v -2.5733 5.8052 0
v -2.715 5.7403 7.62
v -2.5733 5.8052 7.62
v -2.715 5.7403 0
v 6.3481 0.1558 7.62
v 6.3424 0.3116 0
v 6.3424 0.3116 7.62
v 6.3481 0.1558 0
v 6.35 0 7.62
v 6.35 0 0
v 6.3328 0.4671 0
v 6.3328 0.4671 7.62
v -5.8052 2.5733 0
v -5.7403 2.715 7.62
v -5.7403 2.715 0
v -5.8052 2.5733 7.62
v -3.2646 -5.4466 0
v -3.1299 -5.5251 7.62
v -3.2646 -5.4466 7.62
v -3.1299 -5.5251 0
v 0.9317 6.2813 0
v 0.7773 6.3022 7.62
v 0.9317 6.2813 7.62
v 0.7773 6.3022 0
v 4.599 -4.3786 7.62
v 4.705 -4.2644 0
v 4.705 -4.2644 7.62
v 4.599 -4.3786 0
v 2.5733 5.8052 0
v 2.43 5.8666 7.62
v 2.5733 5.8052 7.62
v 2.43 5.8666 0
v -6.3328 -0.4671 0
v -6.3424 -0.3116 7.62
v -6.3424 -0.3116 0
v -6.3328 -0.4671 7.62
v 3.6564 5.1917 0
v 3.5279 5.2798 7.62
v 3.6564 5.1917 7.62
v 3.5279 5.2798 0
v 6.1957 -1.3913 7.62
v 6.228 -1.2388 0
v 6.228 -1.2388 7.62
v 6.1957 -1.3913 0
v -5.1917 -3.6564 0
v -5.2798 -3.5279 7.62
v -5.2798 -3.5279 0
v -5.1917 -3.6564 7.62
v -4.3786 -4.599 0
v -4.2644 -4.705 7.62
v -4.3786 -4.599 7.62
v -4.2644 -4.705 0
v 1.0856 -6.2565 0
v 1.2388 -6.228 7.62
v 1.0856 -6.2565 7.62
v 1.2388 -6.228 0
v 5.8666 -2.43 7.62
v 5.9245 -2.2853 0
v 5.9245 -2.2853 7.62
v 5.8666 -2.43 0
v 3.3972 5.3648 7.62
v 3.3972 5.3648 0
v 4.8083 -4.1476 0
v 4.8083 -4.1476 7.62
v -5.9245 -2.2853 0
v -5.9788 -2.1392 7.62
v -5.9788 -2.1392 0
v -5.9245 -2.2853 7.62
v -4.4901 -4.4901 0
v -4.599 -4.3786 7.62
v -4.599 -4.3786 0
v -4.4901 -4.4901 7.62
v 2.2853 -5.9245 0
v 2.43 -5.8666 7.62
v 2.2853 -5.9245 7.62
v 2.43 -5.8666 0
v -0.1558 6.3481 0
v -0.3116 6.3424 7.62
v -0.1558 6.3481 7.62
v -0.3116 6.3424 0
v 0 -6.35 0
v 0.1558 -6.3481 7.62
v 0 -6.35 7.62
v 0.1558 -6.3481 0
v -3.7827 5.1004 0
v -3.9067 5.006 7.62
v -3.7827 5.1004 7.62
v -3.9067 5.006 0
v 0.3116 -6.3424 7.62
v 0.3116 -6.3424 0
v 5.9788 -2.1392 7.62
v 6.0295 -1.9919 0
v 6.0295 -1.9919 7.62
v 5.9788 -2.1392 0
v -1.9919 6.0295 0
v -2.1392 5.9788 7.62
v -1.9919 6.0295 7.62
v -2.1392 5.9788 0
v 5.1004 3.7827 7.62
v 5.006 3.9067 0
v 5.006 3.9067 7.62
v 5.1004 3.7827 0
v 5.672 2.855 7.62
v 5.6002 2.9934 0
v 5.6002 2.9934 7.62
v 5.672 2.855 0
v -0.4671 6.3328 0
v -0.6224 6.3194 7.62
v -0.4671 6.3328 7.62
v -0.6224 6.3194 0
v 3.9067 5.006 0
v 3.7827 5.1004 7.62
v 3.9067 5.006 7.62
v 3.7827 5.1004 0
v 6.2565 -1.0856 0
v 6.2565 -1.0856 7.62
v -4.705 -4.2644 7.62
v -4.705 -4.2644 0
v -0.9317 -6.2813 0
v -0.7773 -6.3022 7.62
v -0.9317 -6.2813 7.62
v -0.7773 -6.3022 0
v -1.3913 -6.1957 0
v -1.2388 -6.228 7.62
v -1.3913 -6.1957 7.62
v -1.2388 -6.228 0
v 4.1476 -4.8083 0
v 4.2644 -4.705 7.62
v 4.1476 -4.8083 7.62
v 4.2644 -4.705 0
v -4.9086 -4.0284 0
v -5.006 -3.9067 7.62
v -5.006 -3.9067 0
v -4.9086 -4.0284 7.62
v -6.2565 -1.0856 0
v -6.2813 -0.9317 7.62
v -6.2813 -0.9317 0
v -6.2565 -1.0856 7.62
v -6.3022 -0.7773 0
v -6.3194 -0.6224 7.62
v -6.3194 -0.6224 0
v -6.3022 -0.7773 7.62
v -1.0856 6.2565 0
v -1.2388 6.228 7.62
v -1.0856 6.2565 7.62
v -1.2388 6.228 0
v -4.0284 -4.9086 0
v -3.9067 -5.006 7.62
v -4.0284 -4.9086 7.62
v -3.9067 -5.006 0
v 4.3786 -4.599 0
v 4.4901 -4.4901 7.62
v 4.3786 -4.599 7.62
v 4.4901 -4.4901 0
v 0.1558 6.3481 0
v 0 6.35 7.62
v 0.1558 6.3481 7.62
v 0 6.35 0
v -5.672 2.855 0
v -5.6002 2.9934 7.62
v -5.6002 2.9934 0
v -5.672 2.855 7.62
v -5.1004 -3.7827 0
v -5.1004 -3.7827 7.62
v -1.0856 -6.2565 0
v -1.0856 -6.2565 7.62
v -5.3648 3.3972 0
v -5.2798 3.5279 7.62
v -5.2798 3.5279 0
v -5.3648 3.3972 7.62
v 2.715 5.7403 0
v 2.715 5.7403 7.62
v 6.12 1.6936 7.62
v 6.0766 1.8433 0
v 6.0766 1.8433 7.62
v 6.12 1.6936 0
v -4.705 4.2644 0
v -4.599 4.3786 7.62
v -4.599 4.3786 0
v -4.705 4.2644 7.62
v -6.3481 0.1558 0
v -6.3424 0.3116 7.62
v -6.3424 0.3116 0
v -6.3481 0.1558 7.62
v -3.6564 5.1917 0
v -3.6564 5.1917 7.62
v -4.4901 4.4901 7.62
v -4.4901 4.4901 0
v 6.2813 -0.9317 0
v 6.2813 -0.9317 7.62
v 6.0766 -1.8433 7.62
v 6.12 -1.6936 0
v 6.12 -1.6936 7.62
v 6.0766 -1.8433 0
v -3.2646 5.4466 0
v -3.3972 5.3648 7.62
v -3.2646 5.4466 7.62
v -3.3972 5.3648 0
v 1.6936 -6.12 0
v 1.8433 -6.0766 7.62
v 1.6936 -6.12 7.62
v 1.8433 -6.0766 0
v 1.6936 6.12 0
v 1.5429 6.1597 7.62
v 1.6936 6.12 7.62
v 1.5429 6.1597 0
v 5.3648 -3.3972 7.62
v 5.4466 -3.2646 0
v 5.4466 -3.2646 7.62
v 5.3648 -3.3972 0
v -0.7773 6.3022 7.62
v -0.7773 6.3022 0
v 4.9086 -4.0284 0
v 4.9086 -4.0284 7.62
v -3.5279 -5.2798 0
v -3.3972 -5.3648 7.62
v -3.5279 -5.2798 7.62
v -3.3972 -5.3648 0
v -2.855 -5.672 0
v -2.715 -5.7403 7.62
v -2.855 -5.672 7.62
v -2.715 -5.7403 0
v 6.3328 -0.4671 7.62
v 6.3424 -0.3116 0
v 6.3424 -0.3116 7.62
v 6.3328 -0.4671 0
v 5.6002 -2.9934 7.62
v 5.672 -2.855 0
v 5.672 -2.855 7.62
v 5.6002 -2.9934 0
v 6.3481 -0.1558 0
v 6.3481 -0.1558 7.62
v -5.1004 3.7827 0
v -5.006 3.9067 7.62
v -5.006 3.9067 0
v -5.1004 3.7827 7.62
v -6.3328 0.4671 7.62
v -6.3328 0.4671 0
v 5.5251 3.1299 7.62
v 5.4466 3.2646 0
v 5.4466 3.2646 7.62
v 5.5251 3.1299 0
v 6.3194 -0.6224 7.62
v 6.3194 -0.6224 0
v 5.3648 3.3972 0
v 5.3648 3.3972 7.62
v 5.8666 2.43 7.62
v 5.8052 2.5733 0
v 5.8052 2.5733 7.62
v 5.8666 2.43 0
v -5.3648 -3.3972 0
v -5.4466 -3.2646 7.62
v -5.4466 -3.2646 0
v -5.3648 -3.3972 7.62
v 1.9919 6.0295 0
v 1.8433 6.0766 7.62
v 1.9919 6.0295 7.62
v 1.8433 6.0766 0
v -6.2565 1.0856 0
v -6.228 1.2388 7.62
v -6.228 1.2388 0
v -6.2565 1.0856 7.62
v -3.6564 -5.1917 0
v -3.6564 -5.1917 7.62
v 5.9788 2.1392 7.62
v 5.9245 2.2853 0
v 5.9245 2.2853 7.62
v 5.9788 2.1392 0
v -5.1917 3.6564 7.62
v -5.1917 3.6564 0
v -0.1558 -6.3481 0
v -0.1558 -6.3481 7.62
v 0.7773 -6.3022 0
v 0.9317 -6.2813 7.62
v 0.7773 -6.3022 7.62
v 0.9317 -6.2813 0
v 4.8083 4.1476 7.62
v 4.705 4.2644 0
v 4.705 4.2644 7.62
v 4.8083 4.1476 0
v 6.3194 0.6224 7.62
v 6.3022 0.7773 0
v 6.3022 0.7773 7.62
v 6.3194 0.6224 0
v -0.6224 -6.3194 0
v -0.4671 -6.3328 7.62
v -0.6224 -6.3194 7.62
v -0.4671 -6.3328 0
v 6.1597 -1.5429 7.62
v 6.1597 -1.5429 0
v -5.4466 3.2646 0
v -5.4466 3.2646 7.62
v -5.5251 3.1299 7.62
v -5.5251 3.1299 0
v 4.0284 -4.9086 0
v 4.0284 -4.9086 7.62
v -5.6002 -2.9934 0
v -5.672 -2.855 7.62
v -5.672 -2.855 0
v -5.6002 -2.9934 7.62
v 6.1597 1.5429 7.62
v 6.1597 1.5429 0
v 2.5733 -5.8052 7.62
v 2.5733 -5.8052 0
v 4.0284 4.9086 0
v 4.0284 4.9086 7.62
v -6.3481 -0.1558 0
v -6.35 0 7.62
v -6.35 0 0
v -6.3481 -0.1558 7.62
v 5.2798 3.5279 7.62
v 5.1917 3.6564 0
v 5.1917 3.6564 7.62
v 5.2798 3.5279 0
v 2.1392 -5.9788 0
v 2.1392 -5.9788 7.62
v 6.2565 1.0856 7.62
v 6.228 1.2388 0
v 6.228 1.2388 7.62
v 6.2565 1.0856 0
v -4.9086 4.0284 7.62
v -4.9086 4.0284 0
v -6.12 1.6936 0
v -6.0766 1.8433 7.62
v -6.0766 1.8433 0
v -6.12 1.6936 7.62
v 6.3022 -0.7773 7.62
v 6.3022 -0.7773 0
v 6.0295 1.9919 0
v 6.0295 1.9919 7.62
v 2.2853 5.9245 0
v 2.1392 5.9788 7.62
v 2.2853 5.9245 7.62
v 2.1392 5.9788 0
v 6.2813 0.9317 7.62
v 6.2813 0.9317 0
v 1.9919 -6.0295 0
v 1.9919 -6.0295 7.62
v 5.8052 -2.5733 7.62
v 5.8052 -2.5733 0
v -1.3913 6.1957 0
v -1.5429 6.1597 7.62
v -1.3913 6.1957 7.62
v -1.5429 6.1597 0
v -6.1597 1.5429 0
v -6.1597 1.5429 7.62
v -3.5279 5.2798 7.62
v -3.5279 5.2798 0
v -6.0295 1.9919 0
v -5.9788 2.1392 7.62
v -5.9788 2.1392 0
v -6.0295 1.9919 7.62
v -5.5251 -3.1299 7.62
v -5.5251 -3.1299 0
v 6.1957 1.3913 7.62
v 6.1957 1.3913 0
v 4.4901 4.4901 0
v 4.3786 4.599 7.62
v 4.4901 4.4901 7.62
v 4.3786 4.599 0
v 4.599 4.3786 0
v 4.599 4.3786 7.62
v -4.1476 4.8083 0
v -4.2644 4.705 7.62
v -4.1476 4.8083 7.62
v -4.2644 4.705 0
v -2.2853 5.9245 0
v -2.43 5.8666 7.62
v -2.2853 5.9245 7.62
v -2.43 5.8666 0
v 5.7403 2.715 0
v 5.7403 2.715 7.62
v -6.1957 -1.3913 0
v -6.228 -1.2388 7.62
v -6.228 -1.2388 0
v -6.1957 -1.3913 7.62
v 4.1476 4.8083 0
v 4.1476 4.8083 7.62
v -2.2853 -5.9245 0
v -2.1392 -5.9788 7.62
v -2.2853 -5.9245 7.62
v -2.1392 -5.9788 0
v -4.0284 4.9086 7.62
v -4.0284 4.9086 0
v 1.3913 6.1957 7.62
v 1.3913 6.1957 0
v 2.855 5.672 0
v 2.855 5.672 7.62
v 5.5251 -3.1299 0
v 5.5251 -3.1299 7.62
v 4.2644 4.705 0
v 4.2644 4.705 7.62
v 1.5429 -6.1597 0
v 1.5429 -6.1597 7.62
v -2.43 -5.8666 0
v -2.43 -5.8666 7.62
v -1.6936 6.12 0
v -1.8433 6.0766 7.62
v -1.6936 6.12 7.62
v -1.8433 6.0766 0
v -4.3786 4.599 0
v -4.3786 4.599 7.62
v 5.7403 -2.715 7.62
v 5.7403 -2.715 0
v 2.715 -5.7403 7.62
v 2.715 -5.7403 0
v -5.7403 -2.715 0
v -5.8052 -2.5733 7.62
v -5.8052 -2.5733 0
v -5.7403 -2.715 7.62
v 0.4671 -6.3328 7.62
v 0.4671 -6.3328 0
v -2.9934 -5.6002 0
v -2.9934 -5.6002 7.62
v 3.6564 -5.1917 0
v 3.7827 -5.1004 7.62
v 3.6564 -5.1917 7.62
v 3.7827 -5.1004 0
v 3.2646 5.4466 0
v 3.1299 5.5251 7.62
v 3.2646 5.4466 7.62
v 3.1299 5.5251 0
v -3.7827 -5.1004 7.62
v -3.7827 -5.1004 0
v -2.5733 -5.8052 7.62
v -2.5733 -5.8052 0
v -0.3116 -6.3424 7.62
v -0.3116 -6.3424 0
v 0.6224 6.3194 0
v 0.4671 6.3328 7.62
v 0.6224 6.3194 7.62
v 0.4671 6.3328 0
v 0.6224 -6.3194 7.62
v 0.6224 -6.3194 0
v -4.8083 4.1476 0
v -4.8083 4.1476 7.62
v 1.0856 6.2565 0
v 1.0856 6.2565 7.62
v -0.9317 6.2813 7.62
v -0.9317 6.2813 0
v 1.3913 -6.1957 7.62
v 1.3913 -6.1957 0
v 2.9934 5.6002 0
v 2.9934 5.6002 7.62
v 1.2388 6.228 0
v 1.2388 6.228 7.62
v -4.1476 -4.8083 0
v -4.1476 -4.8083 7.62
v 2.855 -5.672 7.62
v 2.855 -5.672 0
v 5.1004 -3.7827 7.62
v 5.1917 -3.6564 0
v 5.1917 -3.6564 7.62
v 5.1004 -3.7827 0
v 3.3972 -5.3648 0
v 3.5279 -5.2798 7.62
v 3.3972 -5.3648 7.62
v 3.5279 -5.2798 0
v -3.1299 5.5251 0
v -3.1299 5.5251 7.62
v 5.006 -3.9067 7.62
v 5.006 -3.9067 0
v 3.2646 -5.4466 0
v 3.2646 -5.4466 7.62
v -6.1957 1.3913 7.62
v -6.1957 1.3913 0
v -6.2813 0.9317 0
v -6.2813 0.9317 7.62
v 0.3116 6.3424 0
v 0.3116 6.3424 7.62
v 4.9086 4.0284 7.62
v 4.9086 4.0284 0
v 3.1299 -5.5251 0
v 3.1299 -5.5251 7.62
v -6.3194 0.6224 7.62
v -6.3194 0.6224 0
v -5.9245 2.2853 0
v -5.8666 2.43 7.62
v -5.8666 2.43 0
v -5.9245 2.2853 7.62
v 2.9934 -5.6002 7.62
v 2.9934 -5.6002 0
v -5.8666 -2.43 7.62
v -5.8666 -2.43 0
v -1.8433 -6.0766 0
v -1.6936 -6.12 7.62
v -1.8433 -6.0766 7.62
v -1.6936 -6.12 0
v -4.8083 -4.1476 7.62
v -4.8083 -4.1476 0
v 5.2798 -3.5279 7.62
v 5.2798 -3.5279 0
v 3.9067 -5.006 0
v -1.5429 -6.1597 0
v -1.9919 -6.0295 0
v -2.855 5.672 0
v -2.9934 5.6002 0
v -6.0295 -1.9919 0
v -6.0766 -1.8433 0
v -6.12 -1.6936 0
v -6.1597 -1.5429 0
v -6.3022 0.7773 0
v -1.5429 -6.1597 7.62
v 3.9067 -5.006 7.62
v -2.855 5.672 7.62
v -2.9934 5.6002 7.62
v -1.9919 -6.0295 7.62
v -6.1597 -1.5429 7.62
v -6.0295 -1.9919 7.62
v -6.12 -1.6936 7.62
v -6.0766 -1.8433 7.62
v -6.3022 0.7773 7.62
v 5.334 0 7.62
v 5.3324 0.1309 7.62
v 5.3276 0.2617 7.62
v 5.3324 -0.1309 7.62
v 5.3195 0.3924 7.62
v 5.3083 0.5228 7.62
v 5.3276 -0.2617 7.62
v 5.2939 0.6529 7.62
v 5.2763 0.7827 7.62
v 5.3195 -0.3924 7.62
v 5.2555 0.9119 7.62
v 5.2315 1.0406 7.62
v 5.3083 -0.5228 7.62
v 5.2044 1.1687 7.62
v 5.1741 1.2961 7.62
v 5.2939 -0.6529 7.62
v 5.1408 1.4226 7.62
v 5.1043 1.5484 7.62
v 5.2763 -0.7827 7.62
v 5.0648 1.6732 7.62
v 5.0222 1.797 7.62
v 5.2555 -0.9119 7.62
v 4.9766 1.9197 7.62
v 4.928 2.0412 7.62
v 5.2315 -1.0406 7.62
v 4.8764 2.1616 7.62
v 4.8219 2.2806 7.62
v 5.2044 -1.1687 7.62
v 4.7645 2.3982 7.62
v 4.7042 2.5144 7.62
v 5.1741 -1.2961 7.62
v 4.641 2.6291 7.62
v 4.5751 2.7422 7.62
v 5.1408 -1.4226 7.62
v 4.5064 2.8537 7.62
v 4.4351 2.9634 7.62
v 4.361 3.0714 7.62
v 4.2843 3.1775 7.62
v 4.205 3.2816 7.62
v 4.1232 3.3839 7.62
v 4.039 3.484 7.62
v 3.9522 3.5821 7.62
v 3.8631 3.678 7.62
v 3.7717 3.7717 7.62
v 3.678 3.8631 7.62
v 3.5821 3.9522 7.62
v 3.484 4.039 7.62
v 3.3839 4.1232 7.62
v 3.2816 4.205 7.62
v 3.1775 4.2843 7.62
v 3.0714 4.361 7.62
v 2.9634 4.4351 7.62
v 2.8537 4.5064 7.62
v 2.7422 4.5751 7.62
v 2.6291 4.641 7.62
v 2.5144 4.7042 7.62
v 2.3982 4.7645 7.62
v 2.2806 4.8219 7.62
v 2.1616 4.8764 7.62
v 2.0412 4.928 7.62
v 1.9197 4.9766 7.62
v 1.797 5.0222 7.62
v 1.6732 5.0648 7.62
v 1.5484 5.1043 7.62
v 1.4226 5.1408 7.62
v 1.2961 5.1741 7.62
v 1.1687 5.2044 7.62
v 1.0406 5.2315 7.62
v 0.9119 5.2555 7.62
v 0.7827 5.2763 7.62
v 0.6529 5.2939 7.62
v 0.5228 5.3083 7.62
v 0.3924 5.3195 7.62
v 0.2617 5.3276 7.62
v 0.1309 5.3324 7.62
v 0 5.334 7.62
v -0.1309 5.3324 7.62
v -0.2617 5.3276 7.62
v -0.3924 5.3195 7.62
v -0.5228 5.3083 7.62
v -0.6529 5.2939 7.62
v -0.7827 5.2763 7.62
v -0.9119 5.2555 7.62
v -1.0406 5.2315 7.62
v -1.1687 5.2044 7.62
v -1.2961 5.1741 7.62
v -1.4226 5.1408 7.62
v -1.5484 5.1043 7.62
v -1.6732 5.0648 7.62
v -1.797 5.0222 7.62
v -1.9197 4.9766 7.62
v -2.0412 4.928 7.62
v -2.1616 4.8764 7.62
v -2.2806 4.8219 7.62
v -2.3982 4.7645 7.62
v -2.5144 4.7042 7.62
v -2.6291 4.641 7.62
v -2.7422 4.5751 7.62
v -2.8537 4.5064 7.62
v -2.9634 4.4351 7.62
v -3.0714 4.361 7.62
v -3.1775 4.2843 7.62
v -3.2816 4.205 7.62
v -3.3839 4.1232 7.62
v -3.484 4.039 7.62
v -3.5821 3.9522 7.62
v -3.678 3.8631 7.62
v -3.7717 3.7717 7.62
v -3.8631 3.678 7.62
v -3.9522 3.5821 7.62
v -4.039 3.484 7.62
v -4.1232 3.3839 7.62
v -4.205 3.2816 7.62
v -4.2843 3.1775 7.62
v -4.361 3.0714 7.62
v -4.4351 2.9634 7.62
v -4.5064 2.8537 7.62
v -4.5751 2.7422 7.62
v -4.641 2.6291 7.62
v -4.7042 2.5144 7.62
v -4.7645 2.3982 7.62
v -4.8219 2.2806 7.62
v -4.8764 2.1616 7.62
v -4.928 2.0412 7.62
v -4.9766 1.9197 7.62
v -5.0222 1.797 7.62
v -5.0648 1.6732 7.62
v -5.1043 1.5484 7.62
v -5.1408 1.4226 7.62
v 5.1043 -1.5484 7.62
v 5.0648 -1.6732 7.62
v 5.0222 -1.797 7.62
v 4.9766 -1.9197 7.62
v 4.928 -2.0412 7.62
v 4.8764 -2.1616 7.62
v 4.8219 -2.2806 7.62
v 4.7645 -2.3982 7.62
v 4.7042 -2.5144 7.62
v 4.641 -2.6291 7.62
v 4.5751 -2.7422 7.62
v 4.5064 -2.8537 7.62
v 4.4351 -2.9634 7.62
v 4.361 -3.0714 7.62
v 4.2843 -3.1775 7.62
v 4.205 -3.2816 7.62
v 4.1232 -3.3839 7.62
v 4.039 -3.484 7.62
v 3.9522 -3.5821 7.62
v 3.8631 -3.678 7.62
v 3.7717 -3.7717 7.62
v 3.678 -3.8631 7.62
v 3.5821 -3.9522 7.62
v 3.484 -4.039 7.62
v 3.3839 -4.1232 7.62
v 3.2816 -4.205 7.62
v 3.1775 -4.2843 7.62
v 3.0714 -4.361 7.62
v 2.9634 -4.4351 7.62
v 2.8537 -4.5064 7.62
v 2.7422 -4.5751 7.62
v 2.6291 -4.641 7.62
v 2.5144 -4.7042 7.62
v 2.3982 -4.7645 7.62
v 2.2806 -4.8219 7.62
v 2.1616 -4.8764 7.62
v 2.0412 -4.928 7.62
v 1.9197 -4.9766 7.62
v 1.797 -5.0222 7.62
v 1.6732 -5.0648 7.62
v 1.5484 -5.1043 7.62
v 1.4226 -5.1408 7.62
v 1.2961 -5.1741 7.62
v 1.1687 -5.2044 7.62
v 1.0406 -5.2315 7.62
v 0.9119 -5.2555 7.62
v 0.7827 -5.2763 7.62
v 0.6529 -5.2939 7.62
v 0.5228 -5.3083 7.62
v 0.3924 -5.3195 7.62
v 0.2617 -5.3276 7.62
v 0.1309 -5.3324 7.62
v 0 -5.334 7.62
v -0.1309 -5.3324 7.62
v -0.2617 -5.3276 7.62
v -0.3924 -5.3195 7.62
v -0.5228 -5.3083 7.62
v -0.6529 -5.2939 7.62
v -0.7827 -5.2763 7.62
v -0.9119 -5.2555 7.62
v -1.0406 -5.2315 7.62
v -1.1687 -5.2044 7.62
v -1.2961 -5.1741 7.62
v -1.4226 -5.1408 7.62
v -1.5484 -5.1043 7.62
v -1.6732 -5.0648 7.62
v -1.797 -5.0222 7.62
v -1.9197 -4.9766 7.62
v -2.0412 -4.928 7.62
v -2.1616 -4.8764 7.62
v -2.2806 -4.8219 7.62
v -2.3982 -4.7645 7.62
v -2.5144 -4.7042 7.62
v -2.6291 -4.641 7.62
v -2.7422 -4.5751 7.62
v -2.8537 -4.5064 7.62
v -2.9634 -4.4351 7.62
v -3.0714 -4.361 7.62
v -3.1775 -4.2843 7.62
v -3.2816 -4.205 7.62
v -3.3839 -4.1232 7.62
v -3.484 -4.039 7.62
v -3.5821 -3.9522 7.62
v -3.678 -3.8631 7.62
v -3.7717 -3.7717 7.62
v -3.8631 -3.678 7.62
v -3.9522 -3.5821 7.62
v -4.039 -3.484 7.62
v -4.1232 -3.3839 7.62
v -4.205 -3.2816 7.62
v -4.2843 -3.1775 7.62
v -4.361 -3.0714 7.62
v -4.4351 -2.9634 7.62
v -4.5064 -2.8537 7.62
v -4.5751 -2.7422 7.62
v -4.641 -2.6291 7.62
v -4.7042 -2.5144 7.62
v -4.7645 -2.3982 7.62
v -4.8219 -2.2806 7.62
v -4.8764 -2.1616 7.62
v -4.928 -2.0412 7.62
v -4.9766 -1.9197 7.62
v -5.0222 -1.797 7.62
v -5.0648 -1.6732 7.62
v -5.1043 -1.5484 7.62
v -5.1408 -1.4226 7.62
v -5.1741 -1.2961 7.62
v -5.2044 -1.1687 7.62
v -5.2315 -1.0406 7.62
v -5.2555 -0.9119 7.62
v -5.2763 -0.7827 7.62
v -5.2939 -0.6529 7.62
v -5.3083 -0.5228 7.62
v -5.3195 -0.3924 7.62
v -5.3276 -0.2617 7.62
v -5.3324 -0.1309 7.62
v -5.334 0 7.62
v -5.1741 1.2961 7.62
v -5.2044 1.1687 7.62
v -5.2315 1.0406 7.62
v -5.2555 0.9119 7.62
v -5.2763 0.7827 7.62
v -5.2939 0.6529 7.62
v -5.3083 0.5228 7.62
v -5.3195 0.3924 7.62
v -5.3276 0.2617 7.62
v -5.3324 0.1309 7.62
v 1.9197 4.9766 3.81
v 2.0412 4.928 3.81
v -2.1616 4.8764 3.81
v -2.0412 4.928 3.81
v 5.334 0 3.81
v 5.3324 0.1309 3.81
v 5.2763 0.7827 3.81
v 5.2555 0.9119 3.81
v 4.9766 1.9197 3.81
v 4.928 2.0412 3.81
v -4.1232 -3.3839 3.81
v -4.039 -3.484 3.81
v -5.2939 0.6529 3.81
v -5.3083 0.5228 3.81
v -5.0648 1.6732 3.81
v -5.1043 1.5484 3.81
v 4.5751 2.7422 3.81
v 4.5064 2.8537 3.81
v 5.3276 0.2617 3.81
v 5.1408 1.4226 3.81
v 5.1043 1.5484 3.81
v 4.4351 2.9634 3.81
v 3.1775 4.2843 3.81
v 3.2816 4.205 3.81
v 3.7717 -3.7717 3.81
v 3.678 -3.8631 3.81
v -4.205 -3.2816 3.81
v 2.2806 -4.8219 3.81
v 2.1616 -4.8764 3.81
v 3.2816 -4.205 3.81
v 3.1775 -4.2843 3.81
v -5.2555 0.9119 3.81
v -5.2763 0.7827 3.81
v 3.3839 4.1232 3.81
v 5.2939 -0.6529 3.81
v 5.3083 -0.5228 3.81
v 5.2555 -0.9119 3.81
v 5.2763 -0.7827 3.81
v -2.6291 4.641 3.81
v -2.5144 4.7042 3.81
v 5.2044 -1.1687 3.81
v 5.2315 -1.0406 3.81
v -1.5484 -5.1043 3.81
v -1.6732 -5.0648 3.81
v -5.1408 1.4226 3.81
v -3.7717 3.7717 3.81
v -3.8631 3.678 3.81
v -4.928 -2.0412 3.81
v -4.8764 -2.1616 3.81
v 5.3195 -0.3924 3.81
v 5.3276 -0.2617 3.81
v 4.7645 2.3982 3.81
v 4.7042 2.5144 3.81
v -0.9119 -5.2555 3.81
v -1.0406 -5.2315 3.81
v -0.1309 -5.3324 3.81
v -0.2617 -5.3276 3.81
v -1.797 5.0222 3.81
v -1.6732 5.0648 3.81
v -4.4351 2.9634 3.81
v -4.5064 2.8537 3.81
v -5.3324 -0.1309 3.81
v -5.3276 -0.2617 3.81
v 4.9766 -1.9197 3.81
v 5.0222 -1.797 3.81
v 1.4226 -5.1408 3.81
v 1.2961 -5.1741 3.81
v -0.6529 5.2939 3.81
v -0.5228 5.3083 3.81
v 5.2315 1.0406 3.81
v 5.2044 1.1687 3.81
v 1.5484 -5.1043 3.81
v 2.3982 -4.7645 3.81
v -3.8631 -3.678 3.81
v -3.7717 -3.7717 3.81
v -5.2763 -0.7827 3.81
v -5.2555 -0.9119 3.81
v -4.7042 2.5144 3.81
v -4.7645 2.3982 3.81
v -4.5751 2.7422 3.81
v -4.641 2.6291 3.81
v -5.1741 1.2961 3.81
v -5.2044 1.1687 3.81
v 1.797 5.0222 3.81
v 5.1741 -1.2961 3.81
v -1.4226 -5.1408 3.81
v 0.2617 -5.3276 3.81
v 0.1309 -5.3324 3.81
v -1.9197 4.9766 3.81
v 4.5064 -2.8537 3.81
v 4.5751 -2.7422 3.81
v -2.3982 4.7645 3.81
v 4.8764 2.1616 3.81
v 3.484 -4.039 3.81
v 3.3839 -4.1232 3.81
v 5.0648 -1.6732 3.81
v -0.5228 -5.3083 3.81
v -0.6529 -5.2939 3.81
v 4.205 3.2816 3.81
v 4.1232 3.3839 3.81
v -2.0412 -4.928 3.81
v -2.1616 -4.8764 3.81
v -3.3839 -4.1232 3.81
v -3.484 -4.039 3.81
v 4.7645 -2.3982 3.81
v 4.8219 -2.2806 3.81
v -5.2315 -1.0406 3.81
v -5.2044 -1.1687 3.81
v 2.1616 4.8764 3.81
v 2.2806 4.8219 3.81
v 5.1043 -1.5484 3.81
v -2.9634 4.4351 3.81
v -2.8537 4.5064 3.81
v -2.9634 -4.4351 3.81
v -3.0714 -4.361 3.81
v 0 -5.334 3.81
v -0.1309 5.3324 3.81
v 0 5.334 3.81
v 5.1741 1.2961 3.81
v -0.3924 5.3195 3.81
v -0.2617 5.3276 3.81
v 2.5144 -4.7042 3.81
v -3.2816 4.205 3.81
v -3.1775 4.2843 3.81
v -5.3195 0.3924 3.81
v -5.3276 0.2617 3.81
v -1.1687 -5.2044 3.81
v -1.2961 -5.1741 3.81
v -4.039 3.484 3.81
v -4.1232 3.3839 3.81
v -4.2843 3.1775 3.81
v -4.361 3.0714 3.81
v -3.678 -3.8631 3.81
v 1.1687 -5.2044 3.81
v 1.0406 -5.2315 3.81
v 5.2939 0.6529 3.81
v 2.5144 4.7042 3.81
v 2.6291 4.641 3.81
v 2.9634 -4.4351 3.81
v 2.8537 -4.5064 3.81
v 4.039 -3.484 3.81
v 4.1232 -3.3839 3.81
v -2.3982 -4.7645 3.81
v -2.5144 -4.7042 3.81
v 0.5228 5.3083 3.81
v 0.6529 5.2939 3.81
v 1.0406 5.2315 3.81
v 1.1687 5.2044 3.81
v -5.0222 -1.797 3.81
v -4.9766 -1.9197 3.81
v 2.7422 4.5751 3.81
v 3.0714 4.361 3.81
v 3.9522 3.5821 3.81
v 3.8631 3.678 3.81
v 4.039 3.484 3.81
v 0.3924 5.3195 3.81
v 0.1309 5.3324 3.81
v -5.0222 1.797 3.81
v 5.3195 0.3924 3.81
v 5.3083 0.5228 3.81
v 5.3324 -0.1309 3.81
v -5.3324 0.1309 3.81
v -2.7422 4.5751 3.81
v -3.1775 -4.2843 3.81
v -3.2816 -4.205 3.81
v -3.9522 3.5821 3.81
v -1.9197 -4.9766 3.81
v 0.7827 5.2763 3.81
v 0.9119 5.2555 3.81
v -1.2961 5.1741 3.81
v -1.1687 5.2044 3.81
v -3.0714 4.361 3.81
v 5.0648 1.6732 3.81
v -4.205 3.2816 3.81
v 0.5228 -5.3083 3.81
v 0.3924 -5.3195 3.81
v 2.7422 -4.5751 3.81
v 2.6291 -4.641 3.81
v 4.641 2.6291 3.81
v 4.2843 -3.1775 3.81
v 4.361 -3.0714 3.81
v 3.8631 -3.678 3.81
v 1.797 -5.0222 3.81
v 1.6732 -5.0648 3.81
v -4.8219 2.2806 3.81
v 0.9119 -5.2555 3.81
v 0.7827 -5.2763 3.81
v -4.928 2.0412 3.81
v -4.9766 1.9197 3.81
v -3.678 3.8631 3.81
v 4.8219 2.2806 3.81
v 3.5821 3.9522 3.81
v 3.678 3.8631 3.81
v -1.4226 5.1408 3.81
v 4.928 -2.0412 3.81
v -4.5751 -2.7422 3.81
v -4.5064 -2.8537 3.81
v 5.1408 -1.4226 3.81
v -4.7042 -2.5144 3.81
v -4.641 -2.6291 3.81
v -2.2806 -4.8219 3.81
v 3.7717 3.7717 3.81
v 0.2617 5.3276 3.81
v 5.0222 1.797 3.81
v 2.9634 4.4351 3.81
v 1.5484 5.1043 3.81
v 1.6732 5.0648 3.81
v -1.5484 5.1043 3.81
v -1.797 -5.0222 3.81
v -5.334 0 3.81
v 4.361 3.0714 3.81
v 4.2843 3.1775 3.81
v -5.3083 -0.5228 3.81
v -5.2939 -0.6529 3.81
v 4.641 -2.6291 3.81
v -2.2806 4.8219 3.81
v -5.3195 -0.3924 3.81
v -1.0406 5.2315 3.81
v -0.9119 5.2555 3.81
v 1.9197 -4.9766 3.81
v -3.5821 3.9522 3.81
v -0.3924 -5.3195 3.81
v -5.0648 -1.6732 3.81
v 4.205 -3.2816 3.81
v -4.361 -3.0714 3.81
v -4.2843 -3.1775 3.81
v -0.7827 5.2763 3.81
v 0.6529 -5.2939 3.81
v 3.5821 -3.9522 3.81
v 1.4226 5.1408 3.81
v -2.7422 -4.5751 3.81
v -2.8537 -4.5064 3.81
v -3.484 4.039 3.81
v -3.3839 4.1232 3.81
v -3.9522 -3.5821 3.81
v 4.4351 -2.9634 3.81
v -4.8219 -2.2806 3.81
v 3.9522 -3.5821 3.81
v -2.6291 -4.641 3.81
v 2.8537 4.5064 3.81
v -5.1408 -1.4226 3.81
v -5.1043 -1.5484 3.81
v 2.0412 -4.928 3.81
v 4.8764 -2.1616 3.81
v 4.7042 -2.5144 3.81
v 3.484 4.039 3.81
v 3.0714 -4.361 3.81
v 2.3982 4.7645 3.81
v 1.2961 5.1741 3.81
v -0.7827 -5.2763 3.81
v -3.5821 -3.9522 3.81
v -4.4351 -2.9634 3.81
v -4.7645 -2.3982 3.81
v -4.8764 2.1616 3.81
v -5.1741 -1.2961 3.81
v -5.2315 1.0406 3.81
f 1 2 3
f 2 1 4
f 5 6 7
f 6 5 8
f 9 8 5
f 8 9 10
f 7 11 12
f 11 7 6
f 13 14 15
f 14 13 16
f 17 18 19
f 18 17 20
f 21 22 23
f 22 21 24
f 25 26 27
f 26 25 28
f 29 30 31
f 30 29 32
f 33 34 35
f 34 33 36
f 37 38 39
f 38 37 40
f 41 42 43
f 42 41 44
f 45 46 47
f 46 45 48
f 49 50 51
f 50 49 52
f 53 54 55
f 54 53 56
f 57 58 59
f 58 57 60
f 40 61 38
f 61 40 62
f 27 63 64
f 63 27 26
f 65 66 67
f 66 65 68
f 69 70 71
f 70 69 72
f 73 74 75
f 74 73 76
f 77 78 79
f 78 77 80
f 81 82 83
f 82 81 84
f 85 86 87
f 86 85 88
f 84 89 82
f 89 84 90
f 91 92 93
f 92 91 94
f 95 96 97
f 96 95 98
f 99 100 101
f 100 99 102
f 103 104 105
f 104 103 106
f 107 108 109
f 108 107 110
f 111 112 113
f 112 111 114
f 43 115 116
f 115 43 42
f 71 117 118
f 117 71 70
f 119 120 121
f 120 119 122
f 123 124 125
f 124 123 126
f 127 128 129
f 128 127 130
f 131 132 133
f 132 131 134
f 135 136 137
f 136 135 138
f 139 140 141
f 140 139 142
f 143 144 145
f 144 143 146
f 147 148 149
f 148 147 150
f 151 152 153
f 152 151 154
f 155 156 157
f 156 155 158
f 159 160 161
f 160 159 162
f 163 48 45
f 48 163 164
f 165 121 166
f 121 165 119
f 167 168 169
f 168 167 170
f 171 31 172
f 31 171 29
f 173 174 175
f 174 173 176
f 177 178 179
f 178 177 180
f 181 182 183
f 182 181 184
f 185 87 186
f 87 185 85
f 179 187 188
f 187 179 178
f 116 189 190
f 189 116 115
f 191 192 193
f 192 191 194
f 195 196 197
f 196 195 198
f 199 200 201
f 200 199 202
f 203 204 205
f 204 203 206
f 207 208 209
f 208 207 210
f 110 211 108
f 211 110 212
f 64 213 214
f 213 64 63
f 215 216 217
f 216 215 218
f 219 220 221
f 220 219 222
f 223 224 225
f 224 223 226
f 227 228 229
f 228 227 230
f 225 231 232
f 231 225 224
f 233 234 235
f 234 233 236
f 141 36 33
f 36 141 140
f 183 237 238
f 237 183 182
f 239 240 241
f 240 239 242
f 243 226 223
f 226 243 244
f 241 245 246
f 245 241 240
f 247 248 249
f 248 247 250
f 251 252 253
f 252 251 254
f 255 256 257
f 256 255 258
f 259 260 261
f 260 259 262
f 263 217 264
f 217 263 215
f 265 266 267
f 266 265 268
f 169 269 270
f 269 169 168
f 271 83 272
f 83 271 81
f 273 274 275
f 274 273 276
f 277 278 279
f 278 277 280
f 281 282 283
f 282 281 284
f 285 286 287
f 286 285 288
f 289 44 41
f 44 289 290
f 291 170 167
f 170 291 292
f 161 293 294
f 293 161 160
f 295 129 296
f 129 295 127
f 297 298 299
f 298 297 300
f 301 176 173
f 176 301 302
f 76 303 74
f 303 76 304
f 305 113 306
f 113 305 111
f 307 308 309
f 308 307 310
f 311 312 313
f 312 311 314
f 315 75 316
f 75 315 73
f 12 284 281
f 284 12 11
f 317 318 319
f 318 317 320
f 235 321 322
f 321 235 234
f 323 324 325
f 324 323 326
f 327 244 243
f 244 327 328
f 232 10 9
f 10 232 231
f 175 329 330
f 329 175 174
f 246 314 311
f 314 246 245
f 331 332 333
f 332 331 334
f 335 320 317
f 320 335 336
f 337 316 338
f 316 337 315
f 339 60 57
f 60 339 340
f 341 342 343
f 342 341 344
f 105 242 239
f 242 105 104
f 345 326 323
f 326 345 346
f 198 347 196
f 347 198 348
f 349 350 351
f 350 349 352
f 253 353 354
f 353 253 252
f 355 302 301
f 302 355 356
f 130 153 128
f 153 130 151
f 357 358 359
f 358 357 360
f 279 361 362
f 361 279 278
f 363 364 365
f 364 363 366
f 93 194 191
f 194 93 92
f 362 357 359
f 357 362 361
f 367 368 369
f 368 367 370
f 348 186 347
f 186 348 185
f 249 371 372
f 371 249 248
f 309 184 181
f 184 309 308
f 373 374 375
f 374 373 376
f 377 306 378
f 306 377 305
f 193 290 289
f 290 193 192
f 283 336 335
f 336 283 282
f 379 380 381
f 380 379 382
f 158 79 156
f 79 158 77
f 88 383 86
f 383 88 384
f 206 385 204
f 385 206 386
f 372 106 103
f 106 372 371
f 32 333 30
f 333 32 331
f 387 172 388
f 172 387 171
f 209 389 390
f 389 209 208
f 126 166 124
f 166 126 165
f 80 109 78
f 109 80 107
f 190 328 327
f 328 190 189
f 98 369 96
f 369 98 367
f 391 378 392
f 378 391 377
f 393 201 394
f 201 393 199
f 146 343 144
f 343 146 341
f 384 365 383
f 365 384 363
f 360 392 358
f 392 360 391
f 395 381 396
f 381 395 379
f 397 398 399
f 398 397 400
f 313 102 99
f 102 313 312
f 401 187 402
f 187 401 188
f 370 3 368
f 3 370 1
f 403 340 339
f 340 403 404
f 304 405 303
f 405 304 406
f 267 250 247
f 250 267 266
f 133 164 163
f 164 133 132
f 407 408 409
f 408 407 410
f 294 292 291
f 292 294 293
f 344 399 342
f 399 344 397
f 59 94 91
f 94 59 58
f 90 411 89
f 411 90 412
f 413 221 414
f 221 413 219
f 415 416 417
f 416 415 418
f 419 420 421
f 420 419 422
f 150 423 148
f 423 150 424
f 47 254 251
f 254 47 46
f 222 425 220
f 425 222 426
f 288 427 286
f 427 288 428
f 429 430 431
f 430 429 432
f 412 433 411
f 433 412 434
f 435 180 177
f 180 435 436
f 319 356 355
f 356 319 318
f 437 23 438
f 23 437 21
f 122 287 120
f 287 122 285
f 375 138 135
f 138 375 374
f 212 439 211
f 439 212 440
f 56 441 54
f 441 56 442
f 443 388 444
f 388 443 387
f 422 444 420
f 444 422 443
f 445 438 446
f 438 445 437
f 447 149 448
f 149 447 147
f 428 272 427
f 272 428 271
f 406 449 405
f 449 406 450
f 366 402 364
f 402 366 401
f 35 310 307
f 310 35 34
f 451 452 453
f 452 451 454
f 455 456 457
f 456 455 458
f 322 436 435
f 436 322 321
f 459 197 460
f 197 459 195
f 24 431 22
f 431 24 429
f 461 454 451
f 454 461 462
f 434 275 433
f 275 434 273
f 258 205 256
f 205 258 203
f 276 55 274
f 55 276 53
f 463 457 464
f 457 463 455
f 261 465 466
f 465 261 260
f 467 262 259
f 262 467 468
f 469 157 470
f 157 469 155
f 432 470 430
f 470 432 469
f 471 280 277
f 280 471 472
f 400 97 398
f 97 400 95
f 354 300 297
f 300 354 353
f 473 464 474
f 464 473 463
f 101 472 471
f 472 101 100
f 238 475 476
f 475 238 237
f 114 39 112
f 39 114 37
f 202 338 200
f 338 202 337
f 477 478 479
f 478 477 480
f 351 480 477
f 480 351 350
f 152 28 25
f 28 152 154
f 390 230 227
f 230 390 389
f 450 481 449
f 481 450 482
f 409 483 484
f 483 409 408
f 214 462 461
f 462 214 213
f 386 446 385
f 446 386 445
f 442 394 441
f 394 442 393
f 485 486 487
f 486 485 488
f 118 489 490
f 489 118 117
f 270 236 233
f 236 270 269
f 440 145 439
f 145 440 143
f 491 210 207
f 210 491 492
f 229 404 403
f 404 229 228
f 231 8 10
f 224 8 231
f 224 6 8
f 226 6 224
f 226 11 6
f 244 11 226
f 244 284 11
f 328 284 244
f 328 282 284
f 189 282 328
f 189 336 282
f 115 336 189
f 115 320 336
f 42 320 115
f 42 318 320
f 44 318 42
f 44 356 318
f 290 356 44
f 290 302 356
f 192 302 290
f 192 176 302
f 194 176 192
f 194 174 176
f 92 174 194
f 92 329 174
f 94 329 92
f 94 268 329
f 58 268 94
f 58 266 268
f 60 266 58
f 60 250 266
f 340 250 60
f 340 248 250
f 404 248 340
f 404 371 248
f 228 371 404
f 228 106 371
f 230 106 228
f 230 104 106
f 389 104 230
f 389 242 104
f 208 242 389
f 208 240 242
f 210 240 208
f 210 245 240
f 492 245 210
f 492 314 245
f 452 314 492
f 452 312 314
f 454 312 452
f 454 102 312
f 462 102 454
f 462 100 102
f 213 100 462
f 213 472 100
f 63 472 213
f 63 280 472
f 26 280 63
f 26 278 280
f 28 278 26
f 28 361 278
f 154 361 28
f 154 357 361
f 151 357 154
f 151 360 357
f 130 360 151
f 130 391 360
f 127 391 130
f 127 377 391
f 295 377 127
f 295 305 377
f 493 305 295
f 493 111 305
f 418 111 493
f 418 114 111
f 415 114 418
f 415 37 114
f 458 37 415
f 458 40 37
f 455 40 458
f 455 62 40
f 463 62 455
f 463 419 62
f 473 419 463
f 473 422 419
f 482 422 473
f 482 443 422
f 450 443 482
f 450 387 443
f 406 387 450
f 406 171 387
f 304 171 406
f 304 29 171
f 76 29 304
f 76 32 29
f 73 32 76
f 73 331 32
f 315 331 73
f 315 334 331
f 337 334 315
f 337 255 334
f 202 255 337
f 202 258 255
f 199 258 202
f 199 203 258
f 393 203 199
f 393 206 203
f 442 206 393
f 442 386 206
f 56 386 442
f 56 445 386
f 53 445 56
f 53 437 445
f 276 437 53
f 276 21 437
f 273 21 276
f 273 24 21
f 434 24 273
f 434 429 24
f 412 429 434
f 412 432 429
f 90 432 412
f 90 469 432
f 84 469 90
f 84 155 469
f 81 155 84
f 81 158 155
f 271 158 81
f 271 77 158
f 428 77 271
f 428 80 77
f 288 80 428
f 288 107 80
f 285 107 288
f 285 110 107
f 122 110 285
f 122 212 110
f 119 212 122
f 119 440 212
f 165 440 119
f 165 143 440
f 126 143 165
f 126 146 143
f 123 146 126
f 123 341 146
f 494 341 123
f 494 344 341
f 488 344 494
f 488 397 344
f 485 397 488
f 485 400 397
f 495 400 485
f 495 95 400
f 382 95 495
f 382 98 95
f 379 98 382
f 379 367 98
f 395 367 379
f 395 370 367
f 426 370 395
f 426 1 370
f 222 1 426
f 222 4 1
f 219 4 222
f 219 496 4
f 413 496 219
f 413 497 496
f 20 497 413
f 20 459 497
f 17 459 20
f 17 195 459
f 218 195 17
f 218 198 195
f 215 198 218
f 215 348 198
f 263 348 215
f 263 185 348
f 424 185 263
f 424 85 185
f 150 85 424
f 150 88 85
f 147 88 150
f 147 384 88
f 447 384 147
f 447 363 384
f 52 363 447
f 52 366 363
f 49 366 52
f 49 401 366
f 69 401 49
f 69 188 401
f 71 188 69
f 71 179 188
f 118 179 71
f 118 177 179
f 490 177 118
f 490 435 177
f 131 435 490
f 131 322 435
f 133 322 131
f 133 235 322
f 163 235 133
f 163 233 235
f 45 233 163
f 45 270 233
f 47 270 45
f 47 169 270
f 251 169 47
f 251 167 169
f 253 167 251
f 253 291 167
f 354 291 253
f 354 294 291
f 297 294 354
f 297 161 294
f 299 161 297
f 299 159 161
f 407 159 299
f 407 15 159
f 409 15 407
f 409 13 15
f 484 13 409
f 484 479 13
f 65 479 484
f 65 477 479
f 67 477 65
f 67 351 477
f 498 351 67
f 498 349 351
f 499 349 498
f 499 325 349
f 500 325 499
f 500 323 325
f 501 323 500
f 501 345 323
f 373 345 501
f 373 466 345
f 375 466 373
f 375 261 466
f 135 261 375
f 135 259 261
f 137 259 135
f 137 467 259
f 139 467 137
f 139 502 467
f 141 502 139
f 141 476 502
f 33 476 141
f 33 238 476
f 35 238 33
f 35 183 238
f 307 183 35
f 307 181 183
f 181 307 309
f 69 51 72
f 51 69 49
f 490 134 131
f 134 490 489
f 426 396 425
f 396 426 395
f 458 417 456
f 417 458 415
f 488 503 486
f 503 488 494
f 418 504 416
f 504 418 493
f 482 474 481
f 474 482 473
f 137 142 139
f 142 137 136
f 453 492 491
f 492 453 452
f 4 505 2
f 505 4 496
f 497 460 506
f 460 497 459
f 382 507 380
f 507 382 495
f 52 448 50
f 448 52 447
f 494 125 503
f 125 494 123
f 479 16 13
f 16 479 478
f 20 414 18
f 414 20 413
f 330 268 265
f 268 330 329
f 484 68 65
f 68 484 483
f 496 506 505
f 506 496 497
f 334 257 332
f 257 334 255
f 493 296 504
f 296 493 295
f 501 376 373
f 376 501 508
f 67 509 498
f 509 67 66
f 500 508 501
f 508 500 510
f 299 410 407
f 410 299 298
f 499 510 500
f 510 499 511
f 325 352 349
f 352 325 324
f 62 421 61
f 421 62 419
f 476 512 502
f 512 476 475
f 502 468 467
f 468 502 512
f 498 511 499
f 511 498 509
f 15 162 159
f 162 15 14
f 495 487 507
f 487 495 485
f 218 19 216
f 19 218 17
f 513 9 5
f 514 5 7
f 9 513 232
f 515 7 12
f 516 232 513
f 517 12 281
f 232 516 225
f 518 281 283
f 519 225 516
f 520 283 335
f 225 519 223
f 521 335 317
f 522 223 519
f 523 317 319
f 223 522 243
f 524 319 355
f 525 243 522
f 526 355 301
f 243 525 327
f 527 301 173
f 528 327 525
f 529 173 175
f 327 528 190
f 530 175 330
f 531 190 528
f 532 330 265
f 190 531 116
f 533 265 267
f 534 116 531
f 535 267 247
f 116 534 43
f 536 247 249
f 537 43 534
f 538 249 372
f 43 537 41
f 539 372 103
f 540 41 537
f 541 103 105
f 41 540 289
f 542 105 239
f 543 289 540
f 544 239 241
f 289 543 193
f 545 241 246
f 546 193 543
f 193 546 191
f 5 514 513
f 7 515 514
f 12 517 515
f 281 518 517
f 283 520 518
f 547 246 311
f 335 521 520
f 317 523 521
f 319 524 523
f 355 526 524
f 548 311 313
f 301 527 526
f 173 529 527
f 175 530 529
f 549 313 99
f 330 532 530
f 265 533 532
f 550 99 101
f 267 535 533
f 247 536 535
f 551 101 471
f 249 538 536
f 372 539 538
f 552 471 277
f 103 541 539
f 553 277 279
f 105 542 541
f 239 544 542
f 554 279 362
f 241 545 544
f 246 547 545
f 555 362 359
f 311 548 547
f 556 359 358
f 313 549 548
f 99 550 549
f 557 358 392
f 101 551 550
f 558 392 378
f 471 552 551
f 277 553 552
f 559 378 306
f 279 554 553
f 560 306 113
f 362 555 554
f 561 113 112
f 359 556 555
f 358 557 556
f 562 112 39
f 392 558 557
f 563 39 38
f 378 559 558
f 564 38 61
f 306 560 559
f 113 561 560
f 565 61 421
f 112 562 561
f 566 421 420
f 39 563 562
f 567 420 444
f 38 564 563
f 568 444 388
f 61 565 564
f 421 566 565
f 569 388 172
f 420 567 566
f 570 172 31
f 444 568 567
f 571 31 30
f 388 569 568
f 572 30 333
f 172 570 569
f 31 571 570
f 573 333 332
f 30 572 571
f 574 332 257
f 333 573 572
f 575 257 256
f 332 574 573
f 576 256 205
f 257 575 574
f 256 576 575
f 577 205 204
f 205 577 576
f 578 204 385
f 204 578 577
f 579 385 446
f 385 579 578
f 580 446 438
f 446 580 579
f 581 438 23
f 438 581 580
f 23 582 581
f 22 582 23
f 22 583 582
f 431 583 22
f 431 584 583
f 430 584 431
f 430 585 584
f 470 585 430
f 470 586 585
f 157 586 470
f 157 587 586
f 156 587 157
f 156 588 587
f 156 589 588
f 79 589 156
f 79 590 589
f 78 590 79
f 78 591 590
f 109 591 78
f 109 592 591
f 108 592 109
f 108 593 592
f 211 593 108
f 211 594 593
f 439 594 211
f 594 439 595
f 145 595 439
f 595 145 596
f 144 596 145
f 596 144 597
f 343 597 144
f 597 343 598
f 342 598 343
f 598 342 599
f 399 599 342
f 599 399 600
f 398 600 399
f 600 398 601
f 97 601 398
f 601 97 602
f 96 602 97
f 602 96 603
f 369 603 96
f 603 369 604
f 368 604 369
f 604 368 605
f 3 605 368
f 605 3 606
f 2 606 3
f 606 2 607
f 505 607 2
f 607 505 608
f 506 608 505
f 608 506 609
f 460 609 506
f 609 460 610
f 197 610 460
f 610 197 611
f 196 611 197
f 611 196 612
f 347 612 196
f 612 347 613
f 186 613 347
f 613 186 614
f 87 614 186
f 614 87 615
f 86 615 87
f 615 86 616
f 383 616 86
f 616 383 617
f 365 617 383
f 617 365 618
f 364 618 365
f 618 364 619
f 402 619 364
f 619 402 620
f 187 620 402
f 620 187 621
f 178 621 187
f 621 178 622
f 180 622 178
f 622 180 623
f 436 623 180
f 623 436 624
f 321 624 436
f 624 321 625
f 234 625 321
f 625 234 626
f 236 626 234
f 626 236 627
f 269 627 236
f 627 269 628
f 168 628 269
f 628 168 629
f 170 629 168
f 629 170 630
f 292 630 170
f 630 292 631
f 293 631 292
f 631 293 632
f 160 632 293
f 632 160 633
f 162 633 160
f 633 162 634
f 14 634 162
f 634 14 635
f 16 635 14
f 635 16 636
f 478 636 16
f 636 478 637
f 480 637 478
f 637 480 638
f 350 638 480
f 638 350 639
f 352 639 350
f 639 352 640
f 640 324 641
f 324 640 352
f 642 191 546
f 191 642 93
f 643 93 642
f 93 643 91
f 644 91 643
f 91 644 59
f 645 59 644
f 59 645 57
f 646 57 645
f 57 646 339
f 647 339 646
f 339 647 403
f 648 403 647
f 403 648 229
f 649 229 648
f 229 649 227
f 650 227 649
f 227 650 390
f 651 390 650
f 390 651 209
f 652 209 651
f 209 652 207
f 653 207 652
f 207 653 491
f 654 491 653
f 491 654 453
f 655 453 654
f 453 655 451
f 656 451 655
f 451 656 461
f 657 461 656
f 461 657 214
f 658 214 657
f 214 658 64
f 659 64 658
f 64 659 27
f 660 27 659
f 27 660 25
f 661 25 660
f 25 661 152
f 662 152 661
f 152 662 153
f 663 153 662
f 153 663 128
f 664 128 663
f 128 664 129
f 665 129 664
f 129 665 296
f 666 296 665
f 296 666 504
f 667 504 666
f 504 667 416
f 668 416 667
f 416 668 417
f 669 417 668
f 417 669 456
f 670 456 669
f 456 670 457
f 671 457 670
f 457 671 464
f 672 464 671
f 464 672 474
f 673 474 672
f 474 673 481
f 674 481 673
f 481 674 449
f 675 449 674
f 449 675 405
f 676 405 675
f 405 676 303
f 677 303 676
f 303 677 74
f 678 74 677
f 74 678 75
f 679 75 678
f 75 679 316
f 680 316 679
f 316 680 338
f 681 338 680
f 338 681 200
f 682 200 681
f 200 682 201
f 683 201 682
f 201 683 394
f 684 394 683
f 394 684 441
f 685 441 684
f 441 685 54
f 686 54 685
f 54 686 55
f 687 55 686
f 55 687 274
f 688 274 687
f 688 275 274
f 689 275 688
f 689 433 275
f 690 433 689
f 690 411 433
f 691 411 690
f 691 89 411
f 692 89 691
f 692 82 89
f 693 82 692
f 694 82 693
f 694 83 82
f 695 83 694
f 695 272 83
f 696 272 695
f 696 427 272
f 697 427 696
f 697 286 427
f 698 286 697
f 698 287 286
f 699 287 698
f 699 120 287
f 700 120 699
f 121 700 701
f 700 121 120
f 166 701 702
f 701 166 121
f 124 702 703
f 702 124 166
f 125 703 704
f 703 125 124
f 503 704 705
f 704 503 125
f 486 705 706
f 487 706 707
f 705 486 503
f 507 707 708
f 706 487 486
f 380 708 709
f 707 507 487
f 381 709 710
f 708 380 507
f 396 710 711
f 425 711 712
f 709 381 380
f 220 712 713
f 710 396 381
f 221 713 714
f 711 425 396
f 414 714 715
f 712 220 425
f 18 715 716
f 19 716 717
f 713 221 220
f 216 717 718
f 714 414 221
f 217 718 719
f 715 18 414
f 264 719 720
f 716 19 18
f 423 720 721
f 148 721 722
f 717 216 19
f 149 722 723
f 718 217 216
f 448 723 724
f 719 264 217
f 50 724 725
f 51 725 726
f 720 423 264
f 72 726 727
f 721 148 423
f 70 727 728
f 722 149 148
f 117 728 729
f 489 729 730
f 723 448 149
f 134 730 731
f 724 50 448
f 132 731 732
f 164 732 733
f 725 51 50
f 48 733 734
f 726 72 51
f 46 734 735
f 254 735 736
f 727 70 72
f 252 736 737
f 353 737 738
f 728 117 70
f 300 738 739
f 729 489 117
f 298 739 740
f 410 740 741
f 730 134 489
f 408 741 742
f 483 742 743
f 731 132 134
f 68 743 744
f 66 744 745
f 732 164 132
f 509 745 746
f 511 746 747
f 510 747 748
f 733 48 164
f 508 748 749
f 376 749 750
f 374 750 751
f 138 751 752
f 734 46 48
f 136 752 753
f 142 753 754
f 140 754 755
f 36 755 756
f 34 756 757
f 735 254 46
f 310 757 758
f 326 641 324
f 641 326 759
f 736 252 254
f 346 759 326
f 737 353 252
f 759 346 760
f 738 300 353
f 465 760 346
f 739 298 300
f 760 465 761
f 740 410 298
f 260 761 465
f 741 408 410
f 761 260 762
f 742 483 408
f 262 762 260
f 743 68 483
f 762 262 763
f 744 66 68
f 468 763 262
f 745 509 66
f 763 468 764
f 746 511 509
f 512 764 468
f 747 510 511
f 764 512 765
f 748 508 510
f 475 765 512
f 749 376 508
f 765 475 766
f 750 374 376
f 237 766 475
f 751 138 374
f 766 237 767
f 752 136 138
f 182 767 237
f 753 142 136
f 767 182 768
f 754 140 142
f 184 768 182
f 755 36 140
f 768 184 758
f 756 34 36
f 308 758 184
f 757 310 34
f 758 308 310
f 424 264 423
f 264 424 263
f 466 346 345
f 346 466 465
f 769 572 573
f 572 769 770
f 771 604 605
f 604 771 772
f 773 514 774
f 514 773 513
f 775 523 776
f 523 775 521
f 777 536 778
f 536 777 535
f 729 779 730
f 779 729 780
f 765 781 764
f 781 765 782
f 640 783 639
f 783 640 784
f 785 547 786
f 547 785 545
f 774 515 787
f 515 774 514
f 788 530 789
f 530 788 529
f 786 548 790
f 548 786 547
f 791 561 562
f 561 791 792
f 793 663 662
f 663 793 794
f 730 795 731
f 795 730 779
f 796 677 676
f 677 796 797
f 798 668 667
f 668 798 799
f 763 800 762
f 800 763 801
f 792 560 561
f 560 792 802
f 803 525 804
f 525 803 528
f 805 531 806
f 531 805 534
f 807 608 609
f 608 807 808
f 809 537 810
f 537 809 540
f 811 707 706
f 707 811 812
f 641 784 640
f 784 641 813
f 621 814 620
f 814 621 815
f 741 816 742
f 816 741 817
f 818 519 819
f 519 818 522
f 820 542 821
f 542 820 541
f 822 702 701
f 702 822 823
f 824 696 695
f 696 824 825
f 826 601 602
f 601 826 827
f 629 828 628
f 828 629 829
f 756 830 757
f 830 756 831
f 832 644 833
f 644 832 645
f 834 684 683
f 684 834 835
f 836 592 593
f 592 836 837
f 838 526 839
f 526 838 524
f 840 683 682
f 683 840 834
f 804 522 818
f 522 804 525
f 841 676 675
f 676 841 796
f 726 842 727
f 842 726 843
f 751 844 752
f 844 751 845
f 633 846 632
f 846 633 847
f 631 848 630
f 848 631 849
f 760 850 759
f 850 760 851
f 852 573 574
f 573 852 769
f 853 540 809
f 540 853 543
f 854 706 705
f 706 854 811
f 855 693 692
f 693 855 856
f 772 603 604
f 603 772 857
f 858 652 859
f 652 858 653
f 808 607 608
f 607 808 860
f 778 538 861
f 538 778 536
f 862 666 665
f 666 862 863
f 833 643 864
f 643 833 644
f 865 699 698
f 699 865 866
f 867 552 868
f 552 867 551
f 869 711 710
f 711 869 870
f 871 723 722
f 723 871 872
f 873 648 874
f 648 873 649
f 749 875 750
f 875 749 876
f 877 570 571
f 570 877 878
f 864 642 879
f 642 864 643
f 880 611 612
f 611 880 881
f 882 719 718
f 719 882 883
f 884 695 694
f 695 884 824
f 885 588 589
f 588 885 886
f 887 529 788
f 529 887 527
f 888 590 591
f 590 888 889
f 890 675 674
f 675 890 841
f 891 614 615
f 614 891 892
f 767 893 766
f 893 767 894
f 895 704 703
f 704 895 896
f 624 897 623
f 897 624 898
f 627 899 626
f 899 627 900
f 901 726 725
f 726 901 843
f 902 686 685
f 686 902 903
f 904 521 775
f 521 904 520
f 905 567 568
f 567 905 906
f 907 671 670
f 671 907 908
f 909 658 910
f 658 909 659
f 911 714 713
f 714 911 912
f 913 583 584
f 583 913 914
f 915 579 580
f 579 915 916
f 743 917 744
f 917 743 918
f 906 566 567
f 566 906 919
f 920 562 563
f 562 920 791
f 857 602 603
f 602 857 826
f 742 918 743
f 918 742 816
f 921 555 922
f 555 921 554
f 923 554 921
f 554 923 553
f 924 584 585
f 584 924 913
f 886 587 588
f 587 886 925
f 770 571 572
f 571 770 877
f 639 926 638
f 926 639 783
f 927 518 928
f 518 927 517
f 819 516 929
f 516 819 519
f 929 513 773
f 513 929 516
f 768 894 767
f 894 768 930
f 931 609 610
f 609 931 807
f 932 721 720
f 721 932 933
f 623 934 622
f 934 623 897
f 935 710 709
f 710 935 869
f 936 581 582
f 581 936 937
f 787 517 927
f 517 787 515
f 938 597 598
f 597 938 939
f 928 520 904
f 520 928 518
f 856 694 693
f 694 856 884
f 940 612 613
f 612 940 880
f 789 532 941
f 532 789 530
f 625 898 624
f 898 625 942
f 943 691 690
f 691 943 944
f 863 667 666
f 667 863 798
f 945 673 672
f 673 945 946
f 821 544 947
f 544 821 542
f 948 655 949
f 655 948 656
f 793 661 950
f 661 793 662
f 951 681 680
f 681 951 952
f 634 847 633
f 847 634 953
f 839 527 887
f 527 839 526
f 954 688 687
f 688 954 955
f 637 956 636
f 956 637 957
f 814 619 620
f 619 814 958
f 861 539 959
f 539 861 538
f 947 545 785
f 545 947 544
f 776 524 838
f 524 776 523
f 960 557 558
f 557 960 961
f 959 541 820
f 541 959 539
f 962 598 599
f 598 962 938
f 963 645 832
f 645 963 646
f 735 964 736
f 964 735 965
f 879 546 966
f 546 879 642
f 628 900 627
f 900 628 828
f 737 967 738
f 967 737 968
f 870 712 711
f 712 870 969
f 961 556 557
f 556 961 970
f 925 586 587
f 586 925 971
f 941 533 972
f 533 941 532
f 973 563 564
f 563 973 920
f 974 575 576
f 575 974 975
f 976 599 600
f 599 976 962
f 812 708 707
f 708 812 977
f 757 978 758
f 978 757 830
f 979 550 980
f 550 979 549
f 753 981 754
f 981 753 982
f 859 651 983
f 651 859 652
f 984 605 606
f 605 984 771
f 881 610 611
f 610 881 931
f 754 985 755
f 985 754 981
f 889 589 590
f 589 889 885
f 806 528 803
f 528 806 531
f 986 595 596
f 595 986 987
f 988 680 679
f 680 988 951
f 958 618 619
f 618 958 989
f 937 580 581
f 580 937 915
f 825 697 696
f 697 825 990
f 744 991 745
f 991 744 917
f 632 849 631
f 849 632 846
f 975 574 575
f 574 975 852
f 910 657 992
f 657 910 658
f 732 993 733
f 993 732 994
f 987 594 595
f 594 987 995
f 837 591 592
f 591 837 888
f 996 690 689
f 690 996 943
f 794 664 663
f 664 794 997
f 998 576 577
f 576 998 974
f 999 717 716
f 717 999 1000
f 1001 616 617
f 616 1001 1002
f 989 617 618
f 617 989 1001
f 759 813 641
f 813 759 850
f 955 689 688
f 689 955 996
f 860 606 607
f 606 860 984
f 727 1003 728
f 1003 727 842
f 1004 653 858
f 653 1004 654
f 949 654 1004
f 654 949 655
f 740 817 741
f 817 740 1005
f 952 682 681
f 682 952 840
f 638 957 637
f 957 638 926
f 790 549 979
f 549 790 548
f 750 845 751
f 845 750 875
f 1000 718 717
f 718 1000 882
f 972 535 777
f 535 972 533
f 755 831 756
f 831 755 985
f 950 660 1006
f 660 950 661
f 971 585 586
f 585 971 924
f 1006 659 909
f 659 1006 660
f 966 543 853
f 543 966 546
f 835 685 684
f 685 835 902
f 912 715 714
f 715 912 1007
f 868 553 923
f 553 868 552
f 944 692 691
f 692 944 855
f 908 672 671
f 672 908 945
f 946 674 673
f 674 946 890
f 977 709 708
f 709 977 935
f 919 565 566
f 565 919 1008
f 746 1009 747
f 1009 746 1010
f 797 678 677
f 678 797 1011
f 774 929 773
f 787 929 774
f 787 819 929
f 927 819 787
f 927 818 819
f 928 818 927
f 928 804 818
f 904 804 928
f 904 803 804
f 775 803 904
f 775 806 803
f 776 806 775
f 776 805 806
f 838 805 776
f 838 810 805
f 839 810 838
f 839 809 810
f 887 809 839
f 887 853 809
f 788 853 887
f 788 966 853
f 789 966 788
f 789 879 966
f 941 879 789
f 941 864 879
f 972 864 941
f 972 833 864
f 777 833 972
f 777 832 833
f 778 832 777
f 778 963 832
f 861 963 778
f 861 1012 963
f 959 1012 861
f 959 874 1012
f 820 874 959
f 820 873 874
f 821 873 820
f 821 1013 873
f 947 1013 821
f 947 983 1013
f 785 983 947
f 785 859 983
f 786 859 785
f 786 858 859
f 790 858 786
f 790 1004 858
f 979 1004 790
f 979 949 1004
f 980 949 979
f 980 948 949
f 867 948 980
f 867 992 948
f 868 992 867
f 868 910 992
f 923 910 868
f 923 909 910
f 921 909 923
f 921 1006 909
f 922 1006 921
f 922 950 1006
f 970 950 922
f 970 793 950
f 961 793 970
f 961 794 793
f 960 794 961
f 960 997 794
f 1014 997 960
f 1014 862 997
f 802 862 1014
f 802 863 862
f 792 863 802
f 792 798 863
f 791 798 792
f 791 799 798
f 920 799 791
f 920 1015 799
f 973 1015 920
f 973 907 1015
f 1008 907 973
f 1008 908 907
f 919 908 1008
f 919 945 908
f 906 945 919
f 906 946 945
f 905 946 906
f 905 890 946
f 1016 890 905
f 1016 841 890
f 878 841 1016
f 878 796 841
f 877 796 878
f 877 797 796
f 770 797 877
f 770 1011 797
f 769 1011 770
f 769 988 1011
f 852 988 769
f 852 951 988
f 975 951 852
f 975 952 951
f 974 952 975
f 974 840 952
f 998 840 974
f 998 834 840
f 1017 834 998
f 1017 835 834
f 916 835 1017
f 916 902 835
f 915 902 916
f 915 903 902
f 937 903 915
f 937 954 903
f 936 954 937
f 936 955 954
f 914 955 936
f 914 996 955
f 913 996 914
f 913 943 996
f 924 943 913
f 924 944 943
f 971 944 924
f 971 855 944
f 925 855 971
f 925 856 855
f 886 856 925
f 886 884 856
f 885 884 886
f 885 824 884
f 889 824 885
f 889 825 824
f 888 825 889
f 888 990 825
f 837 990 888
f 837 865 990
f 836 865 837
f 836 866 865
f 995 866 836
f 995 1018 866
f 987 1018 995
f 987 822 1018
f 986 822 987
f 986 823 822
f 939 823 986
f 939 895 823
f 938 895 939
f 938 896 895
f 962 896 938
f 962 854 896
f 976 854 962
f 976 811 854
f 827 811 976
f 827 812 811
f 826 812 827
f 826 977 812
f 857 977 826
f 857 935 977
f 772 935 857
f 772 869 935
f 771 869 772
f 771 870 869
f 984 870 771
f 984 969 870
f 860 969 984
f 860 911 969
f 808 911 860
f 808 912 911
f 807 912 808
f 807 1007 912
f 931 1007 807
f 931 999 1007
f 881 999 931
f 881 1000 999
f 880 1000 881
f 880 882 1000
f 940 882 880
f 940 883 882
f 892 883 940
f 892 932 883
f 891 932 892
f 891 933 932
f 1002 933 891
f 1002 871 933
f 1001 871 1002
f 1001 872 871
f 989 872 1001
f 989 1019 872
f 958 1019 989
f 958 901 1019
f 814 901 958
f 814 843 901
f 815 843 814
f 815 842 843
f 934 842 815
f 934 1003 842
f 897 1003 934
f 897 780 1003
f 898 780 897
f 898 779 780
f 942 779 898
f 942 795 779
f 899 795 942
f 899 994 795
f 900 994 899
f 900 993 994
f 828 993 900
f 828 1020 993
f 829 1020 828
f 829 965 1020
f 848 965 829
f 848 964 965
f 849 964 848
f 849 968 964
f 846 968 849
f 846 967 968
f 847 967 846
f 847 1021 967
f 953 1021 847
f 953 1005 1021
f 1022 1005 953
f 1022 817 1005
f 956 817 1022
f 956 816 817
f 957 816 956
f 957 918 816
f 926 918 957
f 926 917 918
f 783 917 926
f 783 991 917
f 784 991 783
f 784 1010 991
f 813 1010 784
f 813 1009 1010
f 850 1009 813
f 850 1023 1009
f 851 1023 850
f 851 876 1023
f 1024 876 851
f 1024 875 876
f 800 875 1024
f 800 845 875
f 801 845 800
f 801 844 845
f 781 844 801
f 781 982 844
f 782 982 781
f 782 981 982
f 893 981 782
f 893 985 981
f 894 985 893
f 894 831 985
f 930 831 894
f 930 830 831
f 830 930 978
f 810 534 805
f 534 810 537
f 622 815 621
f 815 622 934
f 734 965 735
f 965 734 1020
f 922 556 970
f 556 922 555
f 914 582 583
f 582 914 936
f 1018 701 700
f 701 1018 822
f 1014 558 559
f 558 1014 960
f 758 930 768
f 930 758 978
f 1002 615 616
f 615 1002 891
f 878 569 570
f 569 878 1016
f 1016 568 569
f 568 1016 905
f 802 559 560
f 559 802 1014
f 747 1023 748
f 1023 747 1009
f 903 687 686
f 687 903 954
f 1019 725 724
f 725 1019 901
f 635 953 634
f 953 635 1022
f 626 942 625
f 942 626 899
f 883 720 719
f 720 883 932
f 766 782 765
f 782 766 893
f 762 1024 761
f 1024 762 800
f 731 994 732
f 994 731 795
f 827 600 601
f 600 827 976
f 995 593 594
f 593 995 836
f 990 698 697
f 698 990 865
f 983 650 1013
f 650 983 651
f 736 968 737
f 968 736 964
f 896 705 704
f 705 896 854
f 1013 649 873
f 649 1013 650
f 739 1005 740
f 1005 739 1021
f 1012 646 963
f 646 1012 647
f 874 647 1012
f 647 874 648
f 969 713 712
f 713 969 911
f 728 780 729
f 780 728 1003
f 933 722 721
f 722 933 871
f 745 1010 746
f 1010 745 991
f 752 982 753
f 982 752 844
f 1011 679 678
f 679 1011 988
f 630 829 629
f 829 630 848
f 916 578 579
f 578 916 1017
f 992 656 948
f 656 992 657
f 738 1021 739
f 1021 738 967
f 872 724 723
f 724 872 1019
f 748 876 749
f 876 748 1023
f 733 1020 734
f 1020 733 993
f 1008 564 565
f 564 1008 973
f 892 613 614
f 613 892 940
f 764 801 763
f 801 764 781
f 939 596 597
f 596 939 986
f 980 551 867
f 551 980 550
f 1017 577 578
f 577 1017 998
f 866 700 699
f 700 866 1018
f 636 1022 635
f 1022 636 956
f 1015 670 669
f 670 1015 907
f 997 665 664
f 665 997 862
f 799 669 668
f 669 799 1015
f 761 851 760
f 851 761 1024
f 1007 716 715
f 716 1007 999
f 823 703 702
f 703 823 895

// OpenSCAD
// Dimensions in inches, converted exactly to millimeters.
inch = 25.4;
outer_diameter = 0.500 * inch;
hole_diameter = 0.420 * inch;
height = 0.300 * inch;
hole_depth = 0.150 * inch;
$fn = 256;
difference() {
    cylinder(d = outer_diameter, h = height);
    translate([0, 0, height - hole_depth])
        cylinder(d = hole_diameter, h = hole_depth + 0.01);
}
